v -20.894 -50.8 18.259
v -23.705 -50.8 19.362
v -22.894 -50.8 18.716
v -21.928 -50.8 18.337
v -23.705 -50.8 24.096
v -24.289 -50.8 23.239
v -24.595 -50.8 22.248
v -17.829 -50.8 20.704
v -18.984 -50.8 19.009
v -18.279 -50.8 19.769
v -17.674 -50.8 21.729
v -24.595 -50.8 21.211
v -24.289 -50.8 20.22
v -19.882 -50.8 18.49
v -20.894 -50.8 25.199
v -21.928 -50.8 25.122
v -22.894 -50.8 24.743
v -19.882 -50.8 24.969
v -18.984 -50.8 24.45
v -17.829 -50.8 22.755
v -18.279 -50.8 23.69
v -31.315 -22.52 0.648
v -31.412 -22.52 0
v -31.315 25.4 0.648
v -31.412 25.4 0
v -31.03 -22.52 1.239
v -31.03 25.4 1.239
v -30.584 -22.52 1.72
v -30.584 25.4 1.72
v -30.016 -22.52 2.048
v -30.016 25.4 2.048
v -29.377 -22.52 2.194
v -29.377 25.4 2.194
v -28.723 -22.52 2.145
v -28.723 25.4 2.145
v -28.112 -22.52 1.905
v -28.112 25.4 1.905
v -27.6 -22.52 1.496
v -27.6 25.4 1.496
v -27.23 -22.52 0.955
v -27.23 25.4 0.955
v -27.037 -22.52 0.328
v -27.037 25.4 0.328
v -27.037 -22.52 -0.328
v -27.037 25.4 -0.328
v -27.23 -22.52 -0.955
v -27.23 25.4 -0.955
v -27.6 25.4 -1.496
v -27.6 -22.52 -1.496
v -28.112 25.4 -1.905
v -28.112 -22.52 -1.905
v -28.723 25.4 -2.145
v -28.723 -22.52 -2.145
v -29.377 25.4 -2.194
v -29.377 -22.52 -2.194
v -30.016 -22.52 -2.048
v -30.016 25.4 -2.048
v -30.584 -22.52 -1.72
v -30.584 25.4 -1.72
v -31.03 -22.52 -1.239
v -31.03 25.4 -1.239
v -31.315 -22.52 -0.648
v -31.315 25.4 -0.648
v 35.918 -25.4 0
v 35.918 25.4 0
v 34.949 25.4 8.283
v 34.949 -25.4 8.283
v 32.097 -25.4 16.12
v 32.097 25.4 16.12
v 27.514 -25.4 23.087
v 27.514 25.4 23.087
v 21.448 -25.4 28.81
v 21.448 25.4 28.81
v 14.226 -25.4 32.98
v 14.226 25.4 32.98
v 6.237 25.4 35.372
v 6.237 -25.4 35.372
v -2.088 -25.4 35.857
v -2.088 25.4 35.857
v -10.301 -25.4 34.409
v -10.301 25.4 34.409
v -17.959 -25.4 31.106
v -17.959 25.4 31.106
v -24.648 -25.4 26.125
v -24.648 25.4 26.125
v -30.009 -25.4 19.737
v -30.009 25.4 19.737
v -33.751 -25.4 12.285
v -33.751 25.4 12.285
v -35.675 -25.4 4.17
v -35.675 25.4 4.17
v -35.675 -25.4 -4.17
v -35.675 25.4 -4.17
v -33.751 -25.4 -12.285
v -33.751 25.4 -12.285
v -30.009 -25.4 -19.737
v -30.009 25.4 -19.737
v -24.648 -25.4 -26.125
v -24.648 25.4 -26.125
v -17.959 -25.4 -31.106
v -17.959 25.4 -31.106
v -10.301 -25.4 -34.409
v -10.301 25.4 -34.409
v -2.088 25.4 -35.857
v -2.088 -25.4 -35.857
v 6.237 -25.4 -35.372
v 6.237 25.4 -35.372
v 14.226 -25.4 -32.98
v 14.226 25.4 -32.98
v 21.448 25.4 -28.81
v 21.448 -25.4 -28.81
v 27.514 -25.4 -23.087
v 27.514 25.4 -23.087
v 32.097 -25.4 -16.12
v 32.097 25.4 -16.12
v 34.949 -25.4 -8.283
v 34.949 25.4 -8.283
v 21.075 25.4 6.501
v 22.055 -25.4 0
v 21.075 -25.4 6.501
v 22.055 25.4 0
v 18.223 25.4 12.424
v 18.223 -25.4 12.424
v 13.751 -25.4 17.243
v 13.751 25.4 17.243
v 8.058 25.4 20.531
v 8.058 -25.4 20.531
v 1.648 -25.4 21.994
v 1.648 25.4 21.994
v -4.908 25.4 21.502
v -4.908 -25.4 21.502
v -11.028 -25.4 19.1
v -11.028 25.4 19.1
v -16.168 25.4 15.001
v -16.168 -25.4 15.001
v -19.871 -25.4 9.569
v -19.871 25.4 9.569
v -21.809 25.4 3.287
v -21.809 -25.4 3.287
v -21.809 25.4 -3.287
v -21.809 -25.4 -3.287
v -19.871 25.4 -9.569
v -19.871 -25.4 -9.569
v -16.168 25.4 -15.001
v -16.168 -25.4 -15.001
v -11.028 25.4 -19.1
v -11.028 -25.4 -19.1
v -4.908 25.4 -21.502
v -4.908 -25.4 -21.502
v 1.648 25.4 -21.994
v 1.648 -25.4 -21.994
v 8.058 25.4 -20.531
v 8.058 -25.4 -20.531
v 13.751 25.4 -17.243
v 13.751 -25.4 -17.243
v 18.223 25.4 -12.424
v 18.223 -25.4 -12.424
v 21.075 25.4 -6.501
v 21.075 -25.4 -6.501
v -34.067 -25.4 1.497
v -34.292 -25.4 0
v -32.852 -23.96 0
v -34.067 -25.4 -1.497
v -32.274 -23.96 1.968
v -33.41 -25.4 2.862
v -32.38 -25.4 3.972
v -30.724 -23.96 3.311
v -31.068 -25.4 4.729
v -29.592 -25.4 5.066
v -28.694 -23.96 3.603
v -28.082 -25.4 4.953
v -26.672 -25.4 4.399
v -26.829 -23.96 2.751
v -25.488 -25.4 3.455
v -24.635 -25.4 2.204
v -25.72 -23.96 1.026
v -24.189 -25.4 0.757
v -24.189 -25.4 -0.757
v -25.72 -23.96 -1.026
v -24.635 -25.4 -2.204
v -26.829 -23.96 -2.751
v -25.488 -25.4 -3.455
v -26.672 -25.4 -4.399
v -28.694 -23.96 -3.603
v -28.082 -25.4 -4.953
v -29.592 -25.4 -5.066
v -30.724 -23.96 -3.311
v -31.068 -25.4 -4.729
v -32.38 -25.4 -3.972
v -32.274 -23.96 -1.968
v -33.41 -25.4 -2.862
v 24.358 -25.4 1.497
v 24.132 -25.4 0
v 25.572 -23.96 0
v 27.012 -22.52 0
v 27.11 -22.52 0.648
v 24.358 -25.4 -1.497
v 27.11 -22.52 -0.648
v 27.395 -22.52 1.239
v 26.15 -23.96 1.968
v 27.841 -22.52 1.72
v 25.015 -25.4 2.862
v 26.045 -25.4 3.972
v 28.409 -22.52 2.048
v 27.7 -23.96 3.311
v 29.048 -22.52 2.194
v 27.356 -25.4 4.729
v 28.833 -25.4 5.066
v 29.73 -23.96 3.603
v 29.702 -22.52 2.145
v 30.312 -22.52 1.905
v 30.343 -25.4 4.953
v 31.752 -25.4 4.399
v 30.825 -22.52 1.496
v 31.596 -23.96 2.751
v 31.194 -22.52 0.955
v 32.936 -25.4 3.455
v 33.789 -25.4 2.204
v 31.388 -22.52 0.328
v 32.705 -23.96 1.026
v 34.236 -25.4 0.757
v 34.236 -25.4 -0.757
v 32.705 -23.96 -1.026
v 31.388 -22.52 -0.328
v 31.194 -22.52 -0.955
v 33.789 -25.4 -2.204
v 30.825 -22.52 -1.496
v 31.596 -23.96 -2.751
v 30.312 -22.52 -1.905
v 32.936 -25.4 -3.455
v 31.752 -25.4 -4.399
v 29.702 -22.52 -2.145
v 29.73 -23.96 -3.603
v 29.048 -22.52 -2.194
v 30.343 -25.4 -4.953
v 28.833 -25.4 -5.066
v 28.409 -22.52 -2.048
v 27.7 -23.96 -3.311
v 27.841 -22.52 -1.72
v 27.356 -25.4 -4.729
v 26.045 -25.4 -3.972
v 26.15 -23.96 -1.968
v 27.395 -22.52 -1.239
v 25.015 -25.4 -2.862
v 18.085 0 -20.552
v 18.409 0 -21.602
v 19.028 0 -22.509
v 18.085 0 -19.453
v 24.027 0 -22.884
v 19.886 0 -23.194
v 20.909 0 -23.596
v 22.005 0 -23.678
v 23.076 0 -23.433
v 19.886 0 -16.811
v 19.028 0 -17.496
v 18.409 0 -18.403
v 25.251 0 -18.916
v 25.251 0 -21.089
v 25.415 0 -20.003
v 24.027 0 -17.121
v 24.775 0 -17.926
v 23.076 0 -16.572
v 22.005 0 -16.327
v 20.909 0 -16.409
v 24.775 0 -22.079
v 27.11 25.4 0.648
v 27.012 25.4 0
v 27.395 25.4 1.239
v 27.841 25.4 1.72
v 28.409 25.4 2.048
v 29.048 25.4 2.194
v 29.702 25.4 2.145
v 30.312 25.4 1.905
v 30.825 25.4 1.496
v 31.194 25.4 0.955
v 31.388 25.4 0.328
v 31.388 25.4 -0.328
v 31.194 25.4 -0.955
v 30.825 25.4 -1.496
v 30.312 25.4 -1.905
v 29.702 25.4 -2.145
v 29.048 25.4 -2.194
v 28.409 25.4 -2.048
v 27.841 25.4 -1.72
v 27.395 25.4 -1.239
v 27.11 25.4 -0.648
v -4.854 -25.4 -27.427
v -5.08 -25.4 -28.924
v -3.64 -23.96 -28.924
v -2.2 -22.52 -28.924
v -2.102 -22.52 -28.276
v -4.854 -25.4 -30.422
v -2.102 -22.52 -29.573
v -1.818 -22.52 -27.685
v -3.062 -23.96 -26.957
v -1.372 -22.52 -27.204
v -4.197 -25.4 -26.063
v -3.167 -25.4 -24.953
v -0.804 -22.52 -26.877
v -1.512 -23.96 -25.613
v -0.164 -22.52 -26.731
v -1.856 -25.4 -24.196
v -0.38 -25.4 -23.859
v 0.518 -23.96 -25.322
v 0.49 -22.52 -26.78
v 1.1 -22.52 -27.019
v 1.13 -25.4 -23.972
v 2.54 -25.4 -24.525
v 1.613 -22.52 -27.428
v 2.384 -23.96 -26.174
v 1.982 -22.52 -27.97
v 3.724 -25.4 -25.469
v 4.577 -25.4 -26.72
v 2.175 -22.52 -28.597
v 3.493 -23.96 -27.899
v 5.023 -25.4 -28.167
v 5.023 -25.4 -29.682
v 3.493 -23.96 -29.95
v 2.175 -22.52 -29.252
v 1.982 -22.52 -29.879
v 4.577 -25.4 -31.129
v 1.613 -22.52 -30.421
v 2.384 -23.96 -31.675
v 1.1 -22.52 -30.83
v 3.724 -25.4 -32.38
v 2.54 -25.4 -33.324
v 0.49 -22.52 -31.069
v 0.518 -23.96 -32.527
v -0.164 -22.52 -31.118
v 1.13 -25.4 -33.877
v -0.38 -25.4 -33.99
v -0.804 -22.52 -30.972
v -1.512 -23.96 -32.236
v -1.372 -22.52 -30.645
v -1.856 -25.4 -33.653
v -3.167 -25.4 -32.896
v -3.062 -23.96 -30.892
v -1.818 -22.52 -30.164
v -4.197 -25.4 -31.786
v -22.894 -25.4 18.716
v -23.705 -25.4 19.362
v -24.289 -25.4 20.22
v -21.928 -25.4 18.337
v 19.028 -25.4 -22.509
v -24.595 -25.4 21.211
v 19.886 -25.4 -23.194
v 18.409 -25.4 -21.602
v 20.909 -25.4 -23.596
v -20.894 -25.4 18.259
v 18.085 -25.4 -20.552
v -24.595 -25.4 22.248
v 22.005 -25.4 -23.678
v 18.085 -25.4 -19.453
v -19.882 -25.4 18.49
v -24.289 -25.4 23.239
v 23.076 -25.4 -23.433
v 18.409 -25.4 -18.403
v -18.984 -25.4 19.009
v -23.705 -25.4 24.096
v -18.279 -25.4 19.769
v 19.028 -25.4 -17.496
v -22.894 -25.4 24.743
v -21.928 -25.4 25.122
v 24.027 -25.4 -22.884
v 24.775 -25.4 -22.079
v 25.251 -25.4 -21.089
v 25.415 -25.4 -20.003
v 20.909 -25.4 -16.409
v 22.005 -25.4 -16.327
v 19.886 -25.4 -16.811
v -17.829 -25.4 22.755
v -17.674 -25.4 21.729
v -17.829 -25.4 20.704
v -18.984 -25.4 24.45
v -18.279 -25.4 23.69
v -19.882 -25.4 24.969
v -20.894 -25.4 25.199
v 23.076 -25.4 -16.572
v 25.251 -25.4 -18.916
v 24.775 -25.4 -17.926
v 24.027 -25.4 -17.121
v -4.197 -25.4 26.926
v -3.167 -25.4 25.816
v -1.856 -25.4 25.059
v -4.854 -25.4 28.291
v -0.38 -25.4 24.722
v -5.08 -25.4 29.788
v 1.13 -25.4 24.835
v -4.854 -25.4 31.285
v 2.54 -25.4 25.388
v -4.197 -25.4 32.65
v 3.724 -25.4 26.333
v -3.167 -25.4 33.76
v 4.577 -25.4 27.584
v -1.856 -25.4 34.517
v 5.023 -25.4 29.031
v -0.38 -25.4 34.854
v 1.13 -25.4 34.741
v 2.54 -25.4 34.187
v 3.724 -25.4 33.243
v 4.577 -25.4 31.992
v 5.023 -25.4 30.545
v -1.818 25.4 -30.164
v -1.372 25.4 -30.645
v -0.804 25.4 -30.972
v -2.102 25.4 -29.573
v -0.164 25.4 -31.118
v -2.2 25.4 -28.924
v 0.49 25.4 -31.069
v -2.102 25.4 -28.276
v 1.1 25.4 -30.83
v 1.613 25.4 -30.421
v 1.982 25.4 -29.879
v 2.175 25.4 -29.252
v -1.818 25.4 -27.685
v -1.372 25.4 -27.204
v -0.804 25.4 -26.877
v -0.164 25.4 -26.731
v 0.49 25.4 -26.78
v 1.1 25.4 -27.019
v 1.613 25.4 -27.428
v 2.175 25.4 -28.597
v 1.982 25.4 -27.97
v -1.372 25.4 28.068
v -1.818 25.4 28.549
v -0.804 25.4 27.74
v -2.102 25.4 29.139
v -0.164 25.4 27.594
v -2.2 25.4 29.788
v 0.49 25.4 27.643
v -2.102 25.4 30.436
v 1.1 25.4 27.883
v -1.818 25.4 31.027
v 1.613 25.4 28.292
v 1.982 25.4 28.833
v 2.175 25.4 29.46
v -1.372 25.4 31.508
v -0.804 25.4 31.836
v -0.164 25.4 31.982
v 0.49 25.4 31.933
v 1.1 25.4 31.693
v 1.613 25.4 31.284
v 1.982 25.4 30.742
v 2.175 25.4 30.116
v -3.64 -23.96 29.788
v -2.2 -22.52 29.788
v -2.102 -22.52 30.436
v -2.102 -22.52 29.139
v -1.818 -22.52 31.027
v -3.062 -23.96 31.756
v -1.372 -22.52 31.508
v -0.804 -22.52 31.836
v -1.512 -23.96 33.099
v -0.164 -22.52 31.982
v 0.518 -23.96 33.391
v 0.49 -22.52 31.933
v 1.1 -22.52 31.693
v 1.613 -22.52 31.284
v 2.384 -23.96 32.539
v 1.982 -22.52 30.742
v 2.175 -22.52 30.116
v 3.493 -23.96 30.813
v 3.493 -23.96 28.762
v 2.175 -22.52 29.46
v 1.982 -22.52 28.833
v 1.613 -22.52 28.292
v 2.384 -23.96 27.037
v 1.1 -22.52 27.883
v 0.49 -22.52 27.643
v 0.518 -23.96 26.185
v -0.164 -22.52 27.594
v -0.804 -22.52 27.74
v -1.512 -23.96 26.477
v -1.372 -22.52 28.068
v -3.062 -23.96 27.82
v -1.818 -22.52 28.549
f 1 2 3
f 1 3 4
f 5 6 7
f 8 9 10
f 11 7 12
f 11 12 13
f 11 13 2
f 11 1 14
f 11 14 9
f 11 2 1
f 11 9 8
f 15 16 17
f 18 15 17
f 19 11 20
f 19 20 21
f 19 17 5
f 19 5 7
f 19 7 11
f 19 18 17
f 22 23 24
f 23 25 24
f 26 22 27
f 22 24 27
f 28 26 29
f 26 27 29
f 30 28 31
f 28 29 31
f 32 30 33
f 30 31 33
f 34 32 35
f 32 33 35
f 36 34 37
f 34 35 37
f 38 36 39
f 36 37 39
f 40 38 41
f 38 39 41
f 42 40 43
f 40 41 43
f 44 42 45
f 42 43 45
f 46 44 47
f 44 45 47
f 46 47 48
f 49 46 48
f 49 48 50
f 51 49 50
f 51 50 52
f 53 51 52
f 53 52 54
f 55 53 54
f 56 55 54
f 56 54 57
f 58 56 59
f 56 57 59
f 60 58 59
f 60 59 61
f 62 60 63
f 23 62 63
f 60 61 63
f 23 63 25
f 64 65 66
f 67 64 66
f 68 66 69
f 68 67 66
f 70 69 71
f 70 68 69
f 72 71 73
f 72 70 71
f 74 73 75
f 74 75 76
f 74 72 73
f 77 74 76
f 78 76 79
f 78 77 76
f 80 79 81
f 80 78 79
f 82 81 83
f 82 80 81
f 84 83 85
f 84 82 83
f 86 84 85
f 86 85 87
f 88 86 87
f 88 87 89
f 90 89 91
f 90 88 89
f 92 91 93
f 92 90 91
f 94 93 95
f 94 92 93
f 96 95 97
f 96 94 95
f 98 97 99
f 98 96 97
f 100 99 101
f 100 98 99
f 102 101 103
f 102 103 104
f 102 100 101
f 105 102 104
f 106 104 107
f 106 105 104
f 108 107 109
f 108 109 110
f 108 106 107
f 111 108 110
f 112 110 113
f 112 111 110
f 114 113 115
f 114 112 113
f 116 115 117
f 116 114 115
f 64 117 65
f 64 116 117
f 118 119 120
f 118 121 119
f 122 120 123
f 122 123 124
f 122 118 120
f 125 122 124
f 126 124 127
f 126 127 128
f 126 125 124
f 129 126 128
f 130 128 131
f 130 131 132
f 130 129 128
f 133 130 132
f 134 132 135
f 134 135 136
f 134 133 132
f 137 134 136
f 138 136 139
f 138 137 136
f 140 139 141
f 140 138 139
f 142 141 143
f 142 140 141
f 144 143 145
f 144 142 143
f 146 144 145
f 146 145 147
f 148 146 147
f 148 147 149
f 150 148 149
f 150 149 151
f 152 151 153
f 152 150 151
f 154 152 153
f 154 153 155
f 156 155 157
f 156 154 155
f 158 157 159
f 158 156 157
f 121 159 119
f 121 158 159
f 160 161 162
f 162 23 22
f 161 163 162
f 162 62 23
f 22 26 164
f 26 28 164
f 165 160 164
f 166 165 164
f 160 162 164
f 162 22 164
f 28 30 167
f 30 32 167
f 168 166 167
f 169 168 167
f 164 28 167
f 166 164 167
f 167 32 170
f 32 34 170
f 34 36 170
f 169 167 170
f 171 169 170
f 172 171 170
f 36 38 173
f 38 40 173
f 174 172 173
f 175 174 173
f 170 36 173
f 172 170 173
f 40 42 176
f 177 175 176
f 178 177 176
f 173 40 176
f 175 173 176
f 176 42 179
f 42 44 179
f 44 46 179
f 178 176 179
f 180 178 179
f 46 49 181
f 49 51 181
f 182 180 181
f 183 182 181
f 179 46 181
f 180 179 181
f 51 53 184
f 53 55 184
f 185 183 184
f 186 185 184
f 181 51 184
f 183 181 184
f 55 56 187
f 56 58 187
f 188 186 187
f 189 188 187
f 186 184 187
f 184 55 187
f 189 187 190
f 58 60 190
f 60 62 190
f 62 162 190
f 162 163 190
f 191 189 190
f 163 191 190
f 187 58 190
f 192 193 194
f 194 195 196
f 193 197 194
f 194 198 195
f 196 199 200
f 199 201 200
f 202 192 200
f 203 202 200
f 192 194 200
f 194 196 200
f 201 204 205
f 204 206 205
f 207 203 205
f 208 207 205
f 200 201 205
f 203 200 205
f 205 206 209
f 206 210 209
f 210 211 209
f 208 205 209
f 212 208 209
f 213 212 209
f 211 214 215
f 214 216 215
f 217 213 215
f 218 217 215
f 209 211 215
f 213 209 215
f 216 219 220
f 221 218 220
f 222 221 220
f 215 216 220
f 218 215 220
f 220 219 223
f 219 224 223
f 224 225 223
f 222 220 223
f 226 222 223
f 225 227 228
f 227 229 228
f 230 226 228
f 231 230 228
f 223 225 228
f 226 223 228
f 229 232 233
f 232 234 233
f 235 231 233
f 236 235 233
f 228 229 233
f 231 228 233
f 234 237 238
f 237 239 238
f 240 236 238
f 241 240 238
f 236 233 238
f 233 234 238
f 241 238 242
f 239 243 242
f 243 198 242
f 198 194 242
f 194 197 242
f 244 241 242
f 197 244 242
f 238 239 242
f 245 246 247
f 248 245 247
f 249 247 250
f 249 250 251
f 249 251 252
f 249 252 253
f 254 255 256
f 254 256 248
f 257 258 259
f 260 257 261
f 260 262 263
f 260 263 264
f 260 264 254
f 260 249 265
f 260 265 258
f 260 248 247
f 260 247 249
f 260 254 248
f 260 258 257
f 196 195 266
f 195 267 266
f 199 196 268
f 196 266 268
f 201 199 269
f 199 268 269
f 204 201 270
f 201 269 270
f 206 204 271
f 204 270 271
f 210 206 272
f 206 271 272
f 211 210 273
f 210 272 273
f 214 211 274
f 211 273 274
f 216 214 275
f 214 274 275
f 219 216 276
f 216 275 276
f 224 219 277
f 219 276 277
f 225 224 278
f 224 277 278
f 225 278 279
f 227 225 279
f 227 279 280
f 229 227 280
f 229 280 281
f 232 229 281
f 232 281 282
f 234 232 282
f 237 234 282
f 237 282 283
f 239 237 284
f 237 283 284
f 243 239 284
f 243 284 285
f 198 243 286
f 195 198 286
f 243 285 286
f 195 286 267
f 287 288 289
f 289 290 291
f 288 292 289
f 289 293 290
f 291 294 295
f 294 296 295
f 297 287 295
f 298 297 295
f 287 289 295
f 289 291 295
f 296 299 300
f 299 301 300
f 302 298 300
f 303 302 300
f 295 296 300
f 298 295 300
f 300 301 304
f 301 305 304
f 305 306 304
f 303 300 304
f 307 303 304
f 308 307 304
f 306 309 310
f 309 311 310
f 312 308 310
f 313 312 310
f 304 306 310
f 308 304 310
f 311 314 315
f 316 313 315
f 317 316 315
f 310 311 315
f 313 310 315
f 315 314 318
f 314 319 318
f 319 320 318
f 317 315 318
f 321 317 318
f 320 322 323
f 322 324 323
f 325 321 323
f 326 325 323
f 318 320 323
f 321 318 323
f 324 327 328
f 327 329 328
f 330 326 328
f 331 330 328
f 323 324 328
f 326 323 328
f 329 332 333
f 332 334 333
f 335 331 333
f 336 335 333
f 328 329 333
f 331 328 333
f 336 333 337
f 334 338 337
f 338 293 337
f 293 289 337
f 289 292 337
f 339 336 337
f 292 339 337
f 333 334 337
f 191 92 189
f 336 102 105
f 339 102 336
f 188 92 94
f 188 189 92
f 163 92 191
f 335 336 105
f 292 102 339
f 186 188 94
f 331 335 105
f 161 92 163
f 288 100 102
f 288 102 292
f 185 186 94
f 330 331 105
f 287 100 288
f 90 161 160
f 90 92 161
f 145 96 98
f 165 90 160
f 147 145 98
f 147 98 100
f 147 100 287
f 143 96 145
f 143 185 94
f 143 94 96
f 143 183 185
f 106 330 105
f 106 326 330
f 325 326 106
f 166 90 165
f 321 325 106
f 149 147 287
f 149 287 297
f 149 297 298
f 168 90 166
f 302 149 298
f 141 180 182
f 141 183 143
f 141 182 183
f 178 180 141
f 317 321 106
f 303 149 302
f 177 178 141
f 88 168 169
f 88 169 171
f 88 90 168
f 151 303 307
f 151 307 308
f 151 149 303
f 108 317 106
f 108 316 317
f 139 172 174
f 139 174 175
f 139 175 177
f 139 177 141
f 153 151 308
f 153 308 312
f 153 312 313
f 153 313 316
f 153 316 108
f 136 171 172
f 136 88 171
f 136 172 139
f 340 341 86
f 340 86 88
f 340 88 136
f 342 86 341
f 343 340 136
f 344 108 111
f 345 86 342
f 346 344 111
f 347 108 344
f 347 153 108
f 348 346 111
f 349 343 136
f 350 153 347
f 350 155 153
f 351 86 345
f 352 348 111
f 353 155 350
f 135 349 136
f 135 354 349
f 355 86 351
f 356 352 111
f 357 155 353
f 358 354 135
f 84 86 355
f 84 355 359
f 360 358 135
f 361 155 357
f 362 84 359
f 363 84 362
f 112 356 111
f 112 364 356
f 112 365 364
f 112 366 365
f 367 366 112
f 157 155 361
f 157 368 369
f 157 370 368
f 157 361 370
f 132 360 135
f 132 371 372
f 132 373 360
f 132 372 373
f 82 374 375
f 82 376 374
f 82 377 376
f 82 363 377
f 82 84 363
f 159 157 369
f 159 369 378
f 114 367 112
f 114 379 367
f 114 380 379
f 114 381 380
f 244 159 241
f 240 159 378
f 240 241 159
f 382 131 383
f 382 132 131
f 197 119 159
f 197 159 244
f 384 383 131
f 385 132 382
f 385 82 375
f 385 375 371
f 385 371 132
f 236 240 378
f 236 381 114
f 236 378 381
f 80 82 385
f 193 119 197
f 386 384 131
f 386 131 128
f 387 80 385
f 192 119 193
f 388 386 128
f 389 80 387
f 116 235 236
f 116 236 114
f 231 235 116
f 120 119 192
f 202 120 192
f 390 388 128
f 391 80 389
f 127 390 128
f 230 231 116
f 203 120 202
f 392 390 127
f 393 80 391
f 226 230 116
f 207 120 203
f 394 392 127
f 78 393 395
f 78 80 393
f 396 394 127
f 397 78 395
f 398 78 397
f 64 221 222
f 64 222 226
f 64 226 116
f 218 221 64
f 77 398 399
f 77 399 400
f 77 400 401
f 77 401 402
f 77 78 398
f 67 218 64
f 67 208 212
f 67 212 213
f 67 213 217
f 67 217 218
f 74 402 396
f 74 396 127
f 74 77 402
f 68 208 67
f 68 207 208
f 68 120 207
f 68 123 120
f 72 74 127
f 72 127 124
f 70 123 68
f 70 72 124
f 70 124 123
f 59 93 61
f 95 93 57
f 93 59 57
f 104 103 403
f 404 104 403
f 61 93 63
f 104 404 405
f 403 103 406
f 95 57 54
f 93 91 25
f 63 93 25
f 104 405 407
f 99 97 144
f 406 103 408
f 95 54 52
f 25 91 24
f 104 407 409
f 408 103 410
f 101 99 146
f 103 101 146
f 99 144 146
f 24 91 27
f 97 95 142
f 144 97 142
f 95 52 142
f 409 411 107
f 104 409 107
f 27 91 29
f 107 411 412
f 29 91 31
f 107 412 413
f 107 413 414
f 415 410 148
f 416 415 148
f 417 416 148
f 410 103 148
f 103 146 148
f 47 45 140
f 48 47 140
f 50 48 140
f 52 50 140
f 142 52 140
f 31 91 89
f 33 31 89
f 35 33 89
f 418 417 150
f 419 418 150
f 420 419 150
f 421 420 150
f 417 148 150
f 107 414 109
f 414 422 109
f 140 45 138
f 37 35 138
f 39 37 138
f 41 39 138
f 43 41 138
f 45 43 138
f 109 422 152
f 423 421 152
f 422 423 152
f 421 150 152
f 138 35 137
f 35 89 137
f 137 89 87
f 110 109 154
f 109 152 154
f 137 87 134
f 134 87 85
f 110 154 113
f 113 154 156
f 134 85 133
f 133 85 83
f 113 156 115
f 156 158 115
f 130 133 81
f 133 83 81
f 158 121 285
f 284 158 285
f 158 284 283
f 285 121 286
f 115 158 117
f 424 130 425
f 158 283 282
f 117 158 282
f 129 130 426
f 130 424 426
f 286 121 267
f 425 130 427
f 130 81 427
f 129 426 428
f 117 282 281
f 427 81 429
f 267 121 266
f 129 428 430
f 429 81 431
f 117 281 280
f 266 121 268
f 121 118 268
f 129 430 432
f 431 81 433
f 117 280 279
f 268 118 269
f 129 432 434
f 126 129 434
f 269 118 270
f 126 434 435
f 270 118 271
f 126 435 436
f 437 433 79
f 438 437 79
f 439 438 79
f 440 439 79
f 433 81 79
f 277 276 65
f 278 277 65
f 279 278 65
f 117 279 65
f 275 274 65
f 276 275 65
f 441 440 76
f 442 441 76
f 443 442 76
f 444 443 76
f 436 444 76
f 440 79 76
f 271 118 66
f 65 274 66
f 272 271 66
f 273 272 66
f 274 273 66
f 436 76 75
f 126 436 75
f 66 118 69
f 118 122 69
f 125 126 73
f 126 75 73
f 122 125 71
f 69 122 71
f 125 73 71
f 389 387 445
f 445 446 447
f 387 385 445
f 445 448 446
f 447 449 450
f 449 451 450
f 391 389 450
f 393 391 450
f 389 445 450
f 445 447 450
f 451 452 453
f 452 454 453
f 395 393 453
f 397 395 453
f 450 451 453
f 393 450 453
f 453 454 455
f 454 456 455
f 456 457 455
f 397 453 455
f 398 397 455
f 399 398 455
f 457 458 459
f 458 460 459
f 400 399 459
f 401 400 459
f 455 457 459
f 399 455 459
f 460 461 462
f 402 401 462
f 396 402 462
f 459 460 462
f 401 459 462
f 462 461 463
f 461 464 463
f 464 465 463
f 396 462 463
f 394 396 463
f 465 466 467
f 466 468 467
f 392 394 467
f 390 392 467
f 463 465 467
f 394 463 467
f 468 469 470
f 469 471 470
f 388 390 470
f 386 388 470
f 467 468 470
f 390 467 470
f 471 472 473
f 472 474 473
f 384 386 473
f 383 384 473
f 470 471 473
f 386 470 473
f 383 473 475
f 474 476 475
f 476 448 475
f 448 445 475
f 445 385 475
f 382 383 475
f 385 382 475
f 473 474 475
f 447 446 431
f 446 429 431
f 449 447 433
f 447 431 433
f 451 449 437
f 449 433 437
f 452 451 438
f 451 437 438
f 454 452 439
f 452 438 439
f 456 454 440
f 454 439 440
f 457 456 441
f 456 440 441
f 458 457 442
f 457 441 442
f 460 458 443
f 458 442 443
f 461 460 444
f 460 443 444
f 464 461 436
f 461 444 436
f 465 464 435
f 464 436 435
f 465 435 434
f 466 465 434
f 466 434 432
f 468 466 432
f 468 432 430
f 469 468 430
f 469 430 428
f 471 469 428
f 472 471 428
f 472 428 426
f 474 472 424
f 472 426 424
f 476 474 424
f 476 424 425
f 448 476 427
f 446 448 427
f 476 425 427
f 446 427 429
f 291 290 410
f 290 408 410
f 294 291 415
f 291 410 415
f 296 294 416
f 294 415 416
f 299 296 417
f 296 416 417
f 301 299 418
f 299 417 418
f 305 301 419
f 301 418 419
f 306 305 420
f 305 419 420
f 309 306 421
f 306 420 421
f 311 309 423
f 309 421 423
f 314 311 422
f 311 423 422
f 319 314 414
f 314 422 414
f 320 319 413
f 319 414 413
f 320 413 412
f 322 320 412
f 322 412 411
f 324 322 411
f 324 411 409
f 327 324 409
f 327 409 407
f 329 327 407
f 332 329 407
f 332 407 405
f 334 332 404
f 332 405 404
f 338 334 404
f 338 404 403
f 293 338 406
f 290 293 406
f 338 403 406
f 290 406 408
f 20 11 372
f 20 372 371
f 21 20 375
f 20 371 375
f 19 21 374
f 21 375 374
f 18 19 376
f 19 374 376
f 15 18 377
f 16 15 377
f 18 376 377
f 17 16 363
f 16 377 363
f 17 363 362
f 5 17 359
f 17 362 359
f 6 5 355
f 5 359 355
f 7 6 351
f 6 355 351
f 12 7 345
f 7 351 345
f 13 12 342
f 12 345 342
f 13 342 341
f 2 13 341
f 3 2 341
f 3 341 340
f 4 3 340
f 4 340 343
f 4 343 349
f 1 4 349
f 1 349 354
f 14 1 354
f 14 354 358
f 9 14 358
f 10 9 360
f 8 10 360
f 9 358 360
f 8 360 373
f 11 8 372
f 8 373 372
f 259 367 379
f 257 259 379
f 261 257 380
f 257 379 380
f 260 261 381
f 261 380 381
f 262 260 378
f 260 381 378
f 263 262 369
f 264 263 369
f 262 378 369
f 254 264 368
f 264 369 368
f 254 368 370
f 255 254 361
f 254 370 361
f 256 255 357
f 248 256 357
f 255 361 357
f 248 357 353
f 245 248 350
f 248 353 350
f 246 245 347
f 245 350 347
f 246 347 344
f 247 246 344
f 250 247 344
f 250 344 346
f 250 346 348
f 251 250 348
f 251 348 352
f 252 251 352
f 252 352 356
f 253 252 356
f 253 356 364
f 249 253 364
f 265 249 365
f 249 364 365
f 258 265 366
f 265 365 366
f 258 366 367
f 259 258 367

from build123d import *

# Parameters (mm, degrees)
F0_R           = 35.917539
F0_R_2         = 22.055201
F1_DEPTH       = 25.4
F3_D           = 4.4
F3_CSINK_D     = 10.16
F3_CSINK_ANGLE = 90
F4_R           = 3.4798
F5_DEPTH       = 25.4
F6_R           = 3.685712
F7_DEPTH       = 25.4


with BuildPart() as f1:
    # F0 (on Front) → F1 (new body, symmetric)
    with BuildSketch(Plane.XZ):
        Circle(F0_R)
        Circle(F0_R_2, mode=Mode.SUBTRACT)
    extrude(amount=F1_DEPTH, both=True)

    # F3 (through all)
    with Locations(Plane.XZ.offset(25.4)):
        with Locations((-29.212285, 0), (0, 29.787894), (29.212283, 0), (0, -28.924478)):
            CounterSinkHole(F3_D / 2, F3_CSINK_D / 2, counter_sink_angle=F3_CSINK_ANGLE)

    # F4 (on face) → F5 (join)
    with BuildSketch(Plane.XZ.offset(25.4)):
        with Locations((-21.153724, 21.729333)):
            Circle(F4_R)
    extrude(amount=F5_DEPTH)

    # F6 (on face) → F7 (cut)
    with BuildSketch(Plane.XZ.offset(25.4)):
        with Locations((21.729335, -20.002501)):
            Circle(F6_R)
    extrude(amount=-F7_DEPTH, mode=Mode.SUBTRACT)


solid = f1.part
